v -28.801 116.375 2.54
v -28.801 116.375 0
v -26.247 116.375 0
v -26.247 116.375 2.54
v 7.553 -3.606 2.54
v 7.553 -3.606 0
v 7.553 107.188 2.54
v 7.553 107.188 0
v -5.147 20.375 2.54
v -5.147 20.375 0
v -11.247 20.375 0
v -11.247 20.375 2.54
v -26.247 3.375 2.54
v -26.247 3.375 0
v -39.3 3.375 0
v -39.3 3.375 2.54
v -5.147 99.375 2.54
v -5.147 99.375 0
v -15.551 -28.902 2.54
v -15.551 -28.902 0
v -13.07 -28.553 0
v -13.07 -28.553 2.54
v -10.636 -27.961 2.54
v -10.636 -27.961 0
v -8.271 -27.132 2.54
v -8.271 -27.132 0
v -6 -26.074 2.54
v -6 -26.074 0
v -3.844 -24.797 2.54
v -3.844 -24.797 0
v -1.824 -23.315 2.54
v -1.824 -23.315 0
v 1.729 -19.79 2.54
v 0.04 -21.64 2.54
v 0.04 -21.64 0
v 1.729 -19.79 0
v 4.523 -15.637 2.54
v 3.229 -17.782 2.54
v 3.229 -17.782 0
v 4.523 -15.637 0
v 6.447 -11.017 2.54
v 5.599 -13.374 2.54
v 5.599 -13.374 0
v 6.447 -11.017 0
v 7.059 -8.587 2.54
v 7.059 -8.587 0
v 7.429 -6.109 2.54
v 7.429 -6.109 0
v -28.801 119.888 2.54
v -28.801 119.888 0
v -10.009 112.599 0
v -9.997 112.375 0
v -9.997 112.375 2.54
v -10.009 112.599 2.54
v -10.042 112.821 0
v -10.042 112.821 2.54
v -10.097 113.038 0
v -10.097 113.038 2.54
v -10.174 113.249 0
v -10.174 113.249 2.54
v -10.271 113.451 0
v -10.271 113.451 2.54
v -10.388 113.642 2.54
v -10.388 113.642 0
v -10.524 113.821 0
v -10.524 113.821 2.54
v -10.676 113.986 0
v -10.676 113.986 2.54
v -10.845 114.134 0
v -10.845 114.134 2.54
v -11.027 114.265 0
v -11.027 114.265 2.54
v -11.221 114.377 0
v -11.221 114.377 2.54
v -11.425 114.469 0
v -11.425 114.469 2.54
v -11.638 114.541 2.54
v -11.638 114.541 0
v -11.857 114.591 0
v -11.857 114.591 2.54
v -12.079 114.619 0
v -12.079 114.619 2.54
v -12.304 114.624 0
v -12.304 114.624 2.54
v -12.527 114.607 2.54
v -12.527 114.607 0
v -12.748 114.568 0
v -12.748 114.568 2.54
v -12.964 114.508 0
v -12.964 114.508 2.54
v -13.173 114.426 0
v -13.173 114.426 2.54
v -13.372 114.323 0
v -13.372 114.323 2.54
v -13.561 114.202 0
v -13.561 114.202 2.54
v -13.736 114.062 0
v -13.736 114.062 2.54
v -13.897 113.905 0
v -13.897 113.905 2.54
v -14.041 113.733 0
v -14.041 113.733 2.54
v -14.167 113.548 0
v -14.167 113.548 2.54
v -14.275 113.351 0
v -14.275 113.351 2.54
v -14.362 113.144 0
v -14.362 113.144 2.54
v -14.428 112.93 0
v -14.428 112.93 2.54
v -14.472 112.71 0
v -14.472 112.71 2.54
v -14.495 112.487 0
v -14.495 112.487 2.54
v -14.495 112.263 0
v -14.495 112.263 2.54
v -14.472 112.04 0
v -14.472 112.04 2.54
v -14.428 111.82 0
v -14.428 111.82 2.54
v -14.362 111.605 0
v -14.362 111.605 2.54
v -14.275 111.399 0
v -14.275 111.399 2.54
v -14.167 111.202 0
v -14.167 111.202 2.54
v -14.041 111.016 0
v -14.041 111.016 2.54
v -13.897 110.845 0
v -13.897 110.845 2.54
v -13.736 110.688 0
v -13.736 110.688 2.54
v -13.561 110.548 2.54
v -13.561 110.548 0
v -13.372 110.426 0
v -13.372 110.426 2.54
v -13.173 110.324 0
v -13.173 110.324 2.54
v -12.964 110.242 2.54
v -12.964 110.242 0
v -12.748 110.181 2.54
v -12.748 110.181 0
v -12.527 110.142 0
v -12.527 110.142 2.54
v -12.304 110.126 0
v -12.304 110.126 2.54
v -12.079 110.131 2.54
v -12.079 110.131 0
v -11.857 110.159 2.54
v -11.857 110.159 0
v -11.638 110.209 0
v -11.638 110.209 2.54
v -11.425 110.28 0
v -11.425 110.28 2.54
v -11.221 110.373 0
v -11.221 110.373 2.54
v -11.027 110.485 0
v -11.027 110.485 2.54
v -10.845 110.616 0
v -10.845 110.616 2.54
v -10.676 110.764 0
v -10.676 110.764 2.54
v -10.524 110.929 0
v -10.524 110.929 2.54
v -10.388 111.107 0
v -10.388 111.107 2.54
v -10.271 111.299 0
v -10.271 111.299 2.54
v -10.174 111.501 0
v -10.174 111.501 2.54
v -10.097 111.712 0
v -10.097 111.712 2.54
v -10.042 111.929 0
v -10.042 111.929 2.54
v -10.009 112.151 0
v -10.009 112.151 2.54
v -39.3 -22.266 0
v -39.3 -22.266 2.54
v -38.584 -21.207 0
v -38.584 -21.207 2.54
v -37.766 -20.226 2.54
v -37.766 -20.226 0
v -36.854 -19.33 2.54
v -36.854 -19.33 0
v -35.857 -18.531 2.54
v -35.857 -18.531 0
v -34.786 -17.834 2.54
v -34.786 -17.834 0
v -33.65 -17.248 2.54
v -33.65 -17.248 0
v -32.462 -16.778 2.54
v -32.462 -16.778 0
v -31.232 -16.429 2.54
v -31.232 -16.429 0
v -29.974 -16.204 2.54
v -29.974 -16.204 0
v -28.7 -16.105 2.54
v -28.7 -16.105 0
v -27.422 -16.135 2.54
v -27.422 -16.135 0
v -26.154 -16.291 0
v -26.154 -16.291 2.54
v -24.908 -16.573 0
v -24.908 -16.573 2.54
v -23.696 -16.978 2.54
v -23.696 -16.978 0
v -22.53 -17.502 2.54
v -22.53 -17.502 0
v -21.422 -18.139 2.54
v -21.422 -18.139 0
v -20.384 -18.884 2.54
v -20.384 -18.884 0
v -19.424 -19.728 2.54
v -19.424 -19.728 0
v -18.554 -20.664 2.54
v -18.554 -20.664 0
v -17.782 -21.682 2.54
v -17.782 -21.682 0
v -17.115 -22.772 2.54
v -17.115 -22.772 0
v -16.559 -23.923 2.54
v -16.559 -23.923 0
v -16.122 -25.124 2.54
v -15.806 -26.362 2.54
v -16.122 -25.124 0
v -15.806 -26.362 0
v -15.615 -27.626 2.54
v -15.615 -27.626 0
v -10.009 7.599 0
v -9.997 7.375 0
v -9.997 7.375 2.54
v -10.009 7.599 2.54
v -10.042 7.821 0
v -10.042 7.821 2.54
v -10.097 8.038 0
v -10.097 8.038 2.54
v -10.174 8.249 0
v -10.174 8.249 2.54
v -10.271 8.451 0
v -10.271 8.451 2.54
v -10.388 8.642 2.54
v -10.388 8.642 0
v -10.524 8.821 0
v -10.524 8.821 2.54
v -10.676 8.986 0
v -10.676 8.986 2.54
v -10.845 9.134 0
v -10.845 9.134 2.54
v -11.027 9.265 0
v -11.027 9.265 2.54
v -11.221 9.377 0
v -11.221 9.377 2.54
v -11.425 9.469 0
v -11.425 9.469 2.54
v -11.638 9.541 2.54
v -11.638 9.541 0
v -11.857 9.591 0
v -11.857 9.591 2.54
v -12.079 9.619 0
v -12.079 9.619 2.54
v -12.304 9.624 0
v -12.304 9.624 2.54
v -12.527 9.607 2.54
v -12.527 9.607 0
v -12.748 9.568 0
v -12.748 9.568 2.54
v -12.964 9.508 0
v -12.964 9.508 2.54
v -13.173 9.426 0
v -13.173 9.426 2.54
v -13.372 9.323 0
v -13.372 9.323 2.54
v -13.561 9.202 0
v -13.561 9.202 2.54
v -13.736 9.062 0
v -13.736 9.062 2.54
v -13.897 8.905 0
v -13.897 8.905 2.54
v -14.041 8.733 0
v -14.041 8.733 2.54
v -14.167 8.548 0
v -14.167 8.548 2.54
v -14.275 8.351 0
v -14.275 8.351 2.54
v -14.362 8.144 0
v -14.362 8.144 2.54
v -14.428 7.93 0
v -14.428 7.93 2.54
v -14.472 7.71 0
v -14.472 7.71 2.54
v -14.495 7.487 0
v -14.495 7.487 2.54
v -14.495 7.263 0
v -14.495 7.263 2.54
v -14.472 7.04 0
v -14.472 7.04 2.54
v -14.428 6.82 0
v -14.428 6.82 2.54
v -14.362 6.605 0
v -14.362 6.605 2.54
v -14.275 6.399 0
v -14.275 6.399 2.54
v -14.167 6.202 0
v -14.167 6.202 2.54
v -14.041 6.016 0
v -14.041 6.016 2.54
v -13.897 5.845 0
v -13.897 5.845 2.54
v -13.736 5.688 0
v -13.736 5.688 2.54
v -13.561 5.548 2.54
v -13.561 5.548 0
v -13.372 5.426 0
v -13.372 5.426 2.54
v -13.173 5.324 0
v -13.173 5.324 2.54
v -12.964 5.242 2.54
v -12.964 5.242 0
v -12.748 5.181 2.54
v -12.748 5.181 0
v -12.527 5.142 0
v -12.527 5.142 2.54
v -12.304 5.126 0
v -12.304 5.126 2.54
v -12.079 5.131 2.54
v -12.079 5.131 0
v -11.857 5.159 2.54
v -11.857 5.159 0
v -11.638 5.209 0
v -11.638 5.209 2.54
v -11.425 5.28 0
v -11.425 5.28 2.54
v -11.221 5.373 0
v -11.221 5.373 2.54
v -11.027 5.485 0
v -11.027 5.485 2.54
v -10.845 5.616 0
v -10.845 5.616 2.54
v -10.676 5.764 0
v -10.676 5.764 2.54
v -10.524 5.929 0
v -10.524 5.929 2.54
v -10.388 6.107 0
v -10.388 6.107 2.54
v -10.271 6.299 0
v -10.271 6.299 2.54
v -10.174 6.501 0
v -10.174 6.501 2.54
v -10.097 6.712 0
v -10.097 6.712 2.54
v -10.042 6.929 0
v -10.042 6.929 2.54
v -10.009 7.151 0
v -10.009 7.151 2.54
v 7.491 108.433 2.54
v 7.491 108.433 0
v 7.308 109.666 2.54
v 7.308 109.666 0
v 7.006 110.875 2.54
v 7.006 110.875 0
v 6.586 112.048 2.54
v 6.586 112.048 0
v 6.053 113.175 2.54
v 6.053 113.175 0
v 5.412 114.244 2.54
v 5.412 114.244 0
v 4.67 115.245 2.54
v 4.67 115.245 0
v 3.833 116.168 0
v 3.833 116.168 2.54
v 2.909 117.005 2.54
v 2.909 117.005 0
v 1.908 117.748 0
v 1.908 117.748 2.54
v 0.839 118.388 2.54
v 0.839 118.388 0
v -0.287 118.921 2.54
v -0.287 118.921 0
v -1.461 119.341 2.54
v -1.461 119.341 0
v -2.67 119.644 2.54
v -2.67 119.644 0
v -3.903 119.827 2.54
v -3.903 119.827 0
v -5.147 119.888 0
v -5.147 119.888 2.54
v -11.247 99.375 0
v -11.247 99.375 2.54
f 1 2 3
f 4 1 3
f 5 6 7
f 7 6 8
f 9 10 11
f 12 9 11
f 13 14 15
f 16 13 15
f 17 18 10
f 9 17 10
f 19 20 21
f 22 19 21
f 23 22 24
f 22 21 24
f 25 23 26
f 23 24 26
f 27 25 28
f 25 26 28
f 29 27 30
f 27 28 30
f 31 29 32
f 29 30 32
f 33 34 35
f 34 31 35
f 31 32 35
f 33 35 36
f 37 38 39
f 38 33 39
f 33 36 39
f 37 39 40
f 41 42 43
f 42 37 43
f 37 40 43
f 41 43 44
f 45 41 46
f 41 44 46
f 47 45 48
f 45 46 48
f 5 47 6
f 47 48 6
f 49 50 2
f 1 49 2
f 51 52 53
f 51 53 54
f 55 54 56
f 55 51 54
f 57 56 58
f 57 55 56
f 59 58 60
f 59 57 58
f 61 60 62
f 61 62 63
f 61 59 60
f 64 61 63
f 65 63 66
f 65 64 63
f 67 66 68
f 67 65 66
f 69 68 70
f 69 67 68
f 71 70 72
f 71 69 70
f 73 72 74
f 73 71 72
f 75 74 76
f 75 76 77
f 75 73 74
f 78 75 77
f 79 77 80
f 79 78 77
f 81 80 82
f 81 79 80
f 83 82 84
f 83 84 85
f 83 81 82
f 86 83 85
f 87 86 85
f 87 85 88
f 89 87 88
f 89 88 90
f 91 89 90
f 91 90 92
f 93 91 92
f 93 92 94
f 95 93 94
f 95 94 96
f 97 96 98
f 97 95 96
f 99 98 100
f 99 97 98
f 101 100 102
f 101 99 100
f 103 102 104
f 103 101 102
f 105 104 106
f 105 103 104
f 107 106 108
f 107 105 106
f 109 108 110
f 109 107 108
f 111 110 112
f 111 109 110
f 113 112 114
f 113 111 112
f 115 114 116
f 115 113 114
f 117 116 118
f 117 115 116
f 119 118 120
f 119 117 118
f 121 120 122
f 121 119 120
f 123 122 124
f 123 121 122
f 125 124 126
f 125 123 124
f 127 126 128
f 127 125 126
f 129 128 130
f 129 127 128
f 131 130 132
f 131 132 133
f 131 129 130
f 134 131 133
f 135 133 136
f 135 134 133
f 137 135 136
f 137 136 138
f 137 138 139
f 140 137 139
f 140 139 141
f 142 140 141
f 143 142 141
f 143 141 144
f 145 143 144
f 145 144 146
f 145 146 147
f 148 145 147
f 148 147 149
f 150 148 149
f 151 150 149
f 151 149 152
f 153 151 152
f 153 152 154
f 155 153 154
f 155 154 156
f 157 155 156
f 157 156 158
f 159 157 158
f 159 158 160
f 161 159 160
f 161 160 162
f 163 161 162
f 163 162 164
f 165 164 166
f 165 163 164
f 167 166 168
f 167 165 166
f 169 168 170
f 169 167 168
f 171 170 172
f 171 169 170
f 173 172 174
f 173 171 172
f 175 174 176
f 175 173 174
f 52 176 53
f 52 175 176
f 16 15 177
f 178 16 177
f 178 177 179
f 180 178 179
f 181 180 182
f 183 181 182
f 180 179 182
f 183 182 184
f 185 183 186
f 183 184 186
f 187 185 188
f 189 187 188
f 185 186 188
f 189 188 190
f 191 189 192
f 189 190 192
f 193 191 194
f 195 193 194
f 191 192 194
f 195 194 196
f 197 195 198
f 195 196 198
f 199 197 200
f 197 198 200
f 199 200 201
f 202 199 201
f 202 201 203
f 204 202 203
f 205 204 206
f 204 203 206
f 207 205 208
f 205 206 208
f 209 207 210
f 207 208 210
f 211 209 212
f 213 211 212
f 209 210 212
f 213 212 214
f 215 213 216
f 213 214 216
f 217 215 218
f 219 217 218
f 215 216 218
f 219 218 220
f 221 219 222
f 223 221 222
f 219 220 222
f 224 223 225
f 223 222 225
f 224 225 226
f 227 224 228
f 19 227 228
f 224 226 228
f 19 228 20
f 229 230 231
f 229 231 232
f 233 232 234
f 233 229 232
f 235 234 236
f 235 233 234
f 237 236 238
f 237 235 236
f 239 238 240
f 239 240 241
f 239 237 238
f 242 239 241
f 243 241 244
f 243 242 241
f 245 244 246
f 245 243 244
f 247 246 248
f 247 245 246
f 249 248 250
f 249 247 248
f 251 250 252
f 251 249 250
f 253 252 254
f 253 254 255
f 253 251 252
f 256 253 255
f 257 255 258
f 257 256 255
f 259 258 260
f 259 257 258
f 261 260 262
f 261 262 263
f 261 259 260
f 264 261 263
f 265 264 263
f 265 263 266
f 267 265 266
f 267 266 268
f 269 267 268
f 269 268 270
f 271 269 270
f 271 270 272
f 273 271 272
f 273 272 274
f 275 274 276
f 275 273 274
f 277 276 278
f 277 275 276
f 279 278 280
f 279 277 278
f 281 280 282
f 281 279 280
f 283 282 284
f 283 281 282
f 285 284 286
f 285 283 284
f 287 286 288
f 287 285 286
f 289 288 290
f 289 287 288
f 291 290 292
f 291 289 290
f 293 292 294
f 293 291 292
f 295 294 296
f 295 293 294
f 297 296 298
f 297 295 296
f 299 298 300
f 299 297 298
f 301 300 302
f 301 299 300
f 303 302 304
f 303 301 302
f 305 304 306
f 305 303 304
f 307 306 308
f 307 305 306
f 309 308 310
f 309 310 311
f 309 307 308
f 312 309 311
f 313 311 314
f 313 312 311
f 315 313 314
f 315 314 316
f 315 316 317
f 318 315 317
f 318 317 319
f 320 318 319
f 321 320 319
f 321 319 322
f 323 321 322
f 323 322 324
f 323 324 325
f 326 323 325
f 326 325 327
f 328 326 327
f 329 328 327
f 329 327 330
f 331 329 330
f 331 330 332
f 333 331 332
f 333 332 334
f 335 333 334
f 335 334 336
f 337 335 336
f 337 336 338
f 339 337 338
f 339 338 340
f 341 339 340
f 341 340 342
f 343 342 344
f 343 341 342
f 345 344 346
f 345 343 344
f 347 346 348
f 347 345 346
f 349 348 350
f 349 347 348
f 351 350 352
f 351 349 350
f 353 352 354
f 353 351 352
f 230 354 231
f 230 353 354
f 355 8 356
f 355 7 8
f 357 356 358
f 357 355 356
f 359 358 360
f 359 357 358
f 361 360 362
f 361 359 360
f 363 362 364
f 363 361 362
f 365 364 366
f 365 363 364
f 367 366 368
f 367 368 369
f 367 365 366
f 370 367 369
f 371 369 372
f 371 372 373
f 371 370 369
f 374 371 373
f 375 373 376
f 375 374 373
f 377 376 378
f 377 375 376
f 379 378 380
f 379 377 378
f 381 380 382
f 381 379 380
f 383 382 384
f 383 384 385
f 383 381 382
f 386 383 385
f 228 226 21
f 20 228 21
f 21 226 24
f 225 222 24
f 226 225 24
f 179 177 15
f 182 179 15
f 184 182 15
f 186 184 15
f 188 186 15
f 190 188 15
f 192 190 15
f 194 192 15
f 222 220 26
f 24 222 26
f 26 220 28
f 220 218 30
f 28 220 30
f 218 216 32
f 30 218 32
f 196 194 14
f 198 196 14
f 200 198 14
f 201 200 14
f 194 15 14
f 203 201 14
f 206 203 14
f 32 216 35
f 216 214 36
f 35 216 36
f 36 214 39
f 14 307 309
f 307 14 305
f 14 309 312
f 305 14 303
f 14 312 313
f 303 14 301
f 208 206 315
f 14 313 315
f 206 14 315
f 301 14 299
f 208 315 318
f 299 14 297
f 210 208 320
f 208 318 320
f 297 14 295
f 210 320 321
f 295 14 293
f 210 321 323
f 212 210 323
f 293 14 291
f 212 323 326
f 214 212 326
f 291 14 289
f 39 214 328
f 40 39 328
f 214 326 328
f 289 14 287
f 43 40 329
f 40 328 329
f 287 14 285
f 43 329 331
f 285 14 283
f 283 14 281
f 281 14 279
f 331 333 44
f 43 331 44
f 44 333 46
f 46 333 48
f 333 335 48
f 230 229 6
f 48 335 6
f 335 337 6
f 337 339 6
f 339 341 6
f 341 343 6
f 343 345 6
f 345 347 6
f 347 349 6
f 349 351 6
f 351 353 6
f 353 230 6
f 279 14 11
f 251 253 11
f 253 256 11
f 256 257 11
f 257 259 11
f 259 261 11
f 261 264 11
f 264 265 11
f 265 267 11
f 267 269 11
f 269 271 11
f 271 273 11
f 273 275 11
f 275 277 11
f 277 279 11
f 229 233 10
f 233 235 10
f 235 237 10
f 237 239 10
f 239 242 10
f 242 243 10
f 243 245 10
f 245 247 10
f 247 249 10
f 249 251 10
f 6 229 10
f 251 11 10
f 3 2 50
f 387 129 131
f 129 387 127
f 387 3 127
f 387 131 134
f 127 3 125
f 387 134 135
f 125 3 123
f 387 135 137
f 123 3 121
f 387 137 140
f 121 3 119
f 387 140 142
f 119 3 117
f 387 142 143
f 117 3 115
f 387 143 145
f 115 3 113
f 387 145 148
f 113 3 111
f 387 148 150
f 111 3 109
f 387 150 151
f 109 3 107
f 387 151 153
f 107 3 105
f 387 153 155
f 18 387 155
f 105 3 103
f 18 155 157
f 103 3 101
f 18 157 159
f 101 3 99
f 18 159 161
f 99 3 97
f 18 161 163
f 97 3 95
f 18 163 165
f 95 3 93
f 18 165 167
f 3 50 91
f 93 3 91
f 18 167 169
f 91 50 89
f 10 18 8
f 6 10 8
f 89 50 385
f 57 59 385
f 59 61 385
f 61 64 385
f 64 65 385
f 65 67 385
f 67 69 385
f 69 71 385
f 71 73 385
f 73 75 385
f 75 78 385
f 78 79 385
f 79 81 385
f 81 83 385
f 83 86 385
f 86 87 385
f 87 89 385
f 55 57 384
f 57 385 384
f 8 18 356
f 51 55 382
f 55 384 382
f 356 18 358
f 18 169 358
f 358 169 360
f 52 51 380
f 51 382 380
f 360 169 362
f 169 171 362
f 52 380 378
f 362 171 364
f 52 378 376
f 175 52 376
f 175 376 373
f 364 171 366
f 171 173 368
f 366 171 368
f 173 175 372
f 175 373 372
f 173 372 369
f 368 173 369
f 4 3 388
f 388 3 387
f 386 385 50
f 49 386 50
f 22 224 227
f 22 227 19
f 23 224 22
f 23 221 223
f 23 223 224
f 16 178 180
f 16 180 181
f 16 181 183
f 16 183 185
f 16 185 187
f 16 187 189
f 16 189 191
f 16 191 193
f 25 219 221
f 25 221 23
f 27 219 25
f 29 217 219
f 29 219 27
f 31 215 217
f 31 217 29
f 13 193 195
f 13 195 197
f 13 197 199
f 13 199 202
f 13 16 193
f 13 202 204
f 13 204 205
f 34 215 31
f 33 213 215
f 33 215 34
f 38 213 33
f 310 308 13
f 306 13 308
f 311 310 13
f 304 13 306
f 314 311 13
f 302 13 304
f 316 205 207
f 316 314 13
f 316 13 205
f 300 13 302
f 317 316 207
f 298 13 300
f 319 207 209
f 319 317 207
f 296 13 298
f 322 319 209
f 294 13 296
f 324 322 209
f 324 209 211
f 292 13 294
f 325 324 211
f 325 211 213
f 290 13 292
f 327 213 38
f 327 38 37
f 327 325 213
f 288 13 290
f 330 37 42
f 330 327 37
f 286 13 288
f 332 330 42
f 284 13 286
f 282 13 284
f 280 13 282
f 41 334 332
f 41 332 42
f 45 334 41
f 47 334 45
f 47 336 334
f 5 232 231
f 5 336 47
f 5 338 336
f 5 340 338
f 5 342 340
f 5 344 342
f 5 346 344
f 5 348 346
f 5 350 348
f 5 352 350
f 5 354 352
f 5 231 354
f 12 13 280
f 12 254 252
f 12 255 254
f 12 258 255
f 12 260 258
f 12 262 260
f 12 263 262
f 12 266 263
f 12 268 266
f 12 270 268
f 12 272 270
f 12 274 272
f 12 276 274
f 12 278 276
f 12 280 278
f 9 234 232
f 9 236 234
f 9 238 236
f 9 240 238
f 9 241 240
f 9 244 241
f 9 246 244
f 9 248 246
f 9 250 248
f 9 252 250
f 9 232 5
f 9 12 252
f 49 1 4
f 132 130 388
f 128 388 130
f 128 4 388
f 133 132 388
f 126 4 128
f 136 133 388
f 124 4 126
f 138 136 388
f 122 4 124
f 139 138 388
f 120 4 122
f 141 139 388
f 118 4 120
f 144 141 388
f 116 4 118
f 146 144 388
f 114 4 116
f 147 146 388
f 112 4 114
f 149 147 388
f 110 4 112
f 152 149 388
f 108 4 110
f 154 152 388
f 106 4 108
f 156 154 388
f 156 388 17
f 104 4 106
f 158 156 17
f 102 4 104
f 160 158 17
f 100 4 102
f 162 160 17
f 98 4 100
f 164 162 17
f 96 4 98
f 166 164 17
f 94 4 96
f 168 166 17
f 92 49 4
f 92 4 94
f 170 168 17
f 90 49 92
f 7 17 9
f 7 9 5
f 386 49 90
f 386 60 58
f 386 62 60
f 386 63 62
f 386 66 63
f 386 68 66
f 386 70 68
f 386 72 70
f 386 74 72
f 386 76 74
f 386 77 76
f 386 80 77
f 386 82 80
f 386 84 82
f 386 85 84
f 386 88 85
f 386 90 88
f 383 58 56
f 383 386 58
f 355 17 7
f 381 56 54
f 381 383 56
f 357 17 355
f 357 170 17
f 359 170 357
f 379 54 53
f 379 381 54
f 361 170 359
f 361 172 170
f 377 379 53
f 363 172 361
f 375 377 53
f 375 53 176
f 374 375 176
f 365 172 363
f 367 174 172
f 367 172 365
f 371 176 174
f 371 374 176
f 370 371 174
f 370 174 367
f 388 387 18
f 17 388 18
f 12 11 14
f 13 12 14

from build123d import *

# Parameters (mm, degrees)
SKETCH1_R           = 2.25
BOSS_EXTRUDE1_DEPTH = 2.54
FILLET2_R           = 12.7
FILLET1_R           = 25.4


with BuildPart() as part:
    # Sketch1 → Boss-Extrude1 (new body)
    with BuildSketch(Plane.XY):
        with BuildLine():
            Line((-15.551371247, -28.902434831), (0, -28.902434831))
            Line((0, -28.902434831), (7.55250204, -28.902434831))
            Line((7.55250204, -28.902434831), (7.55250204, 119.888))
            Line((7.55250204, 119.888), (0, 119.888))
            Line((0, 119.888), (-28.801319167, 119.888))
            Line((-28.801319167, 119.888), (-28.801319167, 116.374908255))
            Line((-28.801319167, 116.374908255), (-26.247498299, 116.374908255))
            Line((-26.247498299, 116.374908255), (-11.247498299, 99.374908255))
            Line((-11.247498299, 99.374908255), (-5.147498299, 99.374908255))
            Line((-5.147498299, 99.374908255), (-5.147498299, 20.374908255))
            Line((-5.147498299, 20.374908255), (-11.247498299, 20.374908255))
            Line((-11.247498299, 20.374908255), (-26.247498299, 3.374908255))
            Line((-26.247498299, 3.374908255), (-39.300222509, 3.374908255))
            Line((-39.300222509, 3.374908255), (-39.300222509, -22.265655957))
            ThreePointArc((-39.300222509, -22.265655957), (-24.907613028, -16.573051533), (-15.551371247, -28.902434831))
        make_face()
        with Locations((-12.247498299, 112.374908255)):
            Circle(SKETCH1_R, mode=Mode.SUBTRACT)
        with Locations((-12.247498299, 7.374908255)):
            Circle(SKETCH1_R, mode=Mode.SUBTRACT)
    extrude(amount=BOSS_EXTRUDE1_DEPTH)

    # Fillet2
    fillet2_edges = [part.edges().sort_by_distance(p)[0] for p in [
        (7.55250204, 119.888, 1.27),
    ]]
    fillet(fillet2_edges, radius=FILLET2_R)

    # Fillet1
    # the kernel refuses this fillet: 25.4 mm, written as the material it takes off along each edge
    with BuildSketch(Plane(origin=(7.55250204, -28.902434831, -63.240009197), x_dir=(0, 1, 0), z_dir=(0, 0, 1))) as fillet1_piece_1:
        with BuildLine():
            CenterArc((25.296003679, 25.4), FILLET1_R, 185.186543812, 84.813456188)
            Line((0, 23.103873287), (-0.505920074, 23.057950753))
            ThreePointArc((-0.505920074, 23.057950753), (-0.508, 11.551936644), (-0.508, 0))
            Line((-0.508, 0), (0, -0.508))
            Line((0, -0.508), (25.296003679, -0.508))
            Line((25.296003679, -0.508), (25.296003679, 0))
        make_face()
    extrude(amount=129.020018394, mode=Mode.SUBTRACT)


solid = part.part
